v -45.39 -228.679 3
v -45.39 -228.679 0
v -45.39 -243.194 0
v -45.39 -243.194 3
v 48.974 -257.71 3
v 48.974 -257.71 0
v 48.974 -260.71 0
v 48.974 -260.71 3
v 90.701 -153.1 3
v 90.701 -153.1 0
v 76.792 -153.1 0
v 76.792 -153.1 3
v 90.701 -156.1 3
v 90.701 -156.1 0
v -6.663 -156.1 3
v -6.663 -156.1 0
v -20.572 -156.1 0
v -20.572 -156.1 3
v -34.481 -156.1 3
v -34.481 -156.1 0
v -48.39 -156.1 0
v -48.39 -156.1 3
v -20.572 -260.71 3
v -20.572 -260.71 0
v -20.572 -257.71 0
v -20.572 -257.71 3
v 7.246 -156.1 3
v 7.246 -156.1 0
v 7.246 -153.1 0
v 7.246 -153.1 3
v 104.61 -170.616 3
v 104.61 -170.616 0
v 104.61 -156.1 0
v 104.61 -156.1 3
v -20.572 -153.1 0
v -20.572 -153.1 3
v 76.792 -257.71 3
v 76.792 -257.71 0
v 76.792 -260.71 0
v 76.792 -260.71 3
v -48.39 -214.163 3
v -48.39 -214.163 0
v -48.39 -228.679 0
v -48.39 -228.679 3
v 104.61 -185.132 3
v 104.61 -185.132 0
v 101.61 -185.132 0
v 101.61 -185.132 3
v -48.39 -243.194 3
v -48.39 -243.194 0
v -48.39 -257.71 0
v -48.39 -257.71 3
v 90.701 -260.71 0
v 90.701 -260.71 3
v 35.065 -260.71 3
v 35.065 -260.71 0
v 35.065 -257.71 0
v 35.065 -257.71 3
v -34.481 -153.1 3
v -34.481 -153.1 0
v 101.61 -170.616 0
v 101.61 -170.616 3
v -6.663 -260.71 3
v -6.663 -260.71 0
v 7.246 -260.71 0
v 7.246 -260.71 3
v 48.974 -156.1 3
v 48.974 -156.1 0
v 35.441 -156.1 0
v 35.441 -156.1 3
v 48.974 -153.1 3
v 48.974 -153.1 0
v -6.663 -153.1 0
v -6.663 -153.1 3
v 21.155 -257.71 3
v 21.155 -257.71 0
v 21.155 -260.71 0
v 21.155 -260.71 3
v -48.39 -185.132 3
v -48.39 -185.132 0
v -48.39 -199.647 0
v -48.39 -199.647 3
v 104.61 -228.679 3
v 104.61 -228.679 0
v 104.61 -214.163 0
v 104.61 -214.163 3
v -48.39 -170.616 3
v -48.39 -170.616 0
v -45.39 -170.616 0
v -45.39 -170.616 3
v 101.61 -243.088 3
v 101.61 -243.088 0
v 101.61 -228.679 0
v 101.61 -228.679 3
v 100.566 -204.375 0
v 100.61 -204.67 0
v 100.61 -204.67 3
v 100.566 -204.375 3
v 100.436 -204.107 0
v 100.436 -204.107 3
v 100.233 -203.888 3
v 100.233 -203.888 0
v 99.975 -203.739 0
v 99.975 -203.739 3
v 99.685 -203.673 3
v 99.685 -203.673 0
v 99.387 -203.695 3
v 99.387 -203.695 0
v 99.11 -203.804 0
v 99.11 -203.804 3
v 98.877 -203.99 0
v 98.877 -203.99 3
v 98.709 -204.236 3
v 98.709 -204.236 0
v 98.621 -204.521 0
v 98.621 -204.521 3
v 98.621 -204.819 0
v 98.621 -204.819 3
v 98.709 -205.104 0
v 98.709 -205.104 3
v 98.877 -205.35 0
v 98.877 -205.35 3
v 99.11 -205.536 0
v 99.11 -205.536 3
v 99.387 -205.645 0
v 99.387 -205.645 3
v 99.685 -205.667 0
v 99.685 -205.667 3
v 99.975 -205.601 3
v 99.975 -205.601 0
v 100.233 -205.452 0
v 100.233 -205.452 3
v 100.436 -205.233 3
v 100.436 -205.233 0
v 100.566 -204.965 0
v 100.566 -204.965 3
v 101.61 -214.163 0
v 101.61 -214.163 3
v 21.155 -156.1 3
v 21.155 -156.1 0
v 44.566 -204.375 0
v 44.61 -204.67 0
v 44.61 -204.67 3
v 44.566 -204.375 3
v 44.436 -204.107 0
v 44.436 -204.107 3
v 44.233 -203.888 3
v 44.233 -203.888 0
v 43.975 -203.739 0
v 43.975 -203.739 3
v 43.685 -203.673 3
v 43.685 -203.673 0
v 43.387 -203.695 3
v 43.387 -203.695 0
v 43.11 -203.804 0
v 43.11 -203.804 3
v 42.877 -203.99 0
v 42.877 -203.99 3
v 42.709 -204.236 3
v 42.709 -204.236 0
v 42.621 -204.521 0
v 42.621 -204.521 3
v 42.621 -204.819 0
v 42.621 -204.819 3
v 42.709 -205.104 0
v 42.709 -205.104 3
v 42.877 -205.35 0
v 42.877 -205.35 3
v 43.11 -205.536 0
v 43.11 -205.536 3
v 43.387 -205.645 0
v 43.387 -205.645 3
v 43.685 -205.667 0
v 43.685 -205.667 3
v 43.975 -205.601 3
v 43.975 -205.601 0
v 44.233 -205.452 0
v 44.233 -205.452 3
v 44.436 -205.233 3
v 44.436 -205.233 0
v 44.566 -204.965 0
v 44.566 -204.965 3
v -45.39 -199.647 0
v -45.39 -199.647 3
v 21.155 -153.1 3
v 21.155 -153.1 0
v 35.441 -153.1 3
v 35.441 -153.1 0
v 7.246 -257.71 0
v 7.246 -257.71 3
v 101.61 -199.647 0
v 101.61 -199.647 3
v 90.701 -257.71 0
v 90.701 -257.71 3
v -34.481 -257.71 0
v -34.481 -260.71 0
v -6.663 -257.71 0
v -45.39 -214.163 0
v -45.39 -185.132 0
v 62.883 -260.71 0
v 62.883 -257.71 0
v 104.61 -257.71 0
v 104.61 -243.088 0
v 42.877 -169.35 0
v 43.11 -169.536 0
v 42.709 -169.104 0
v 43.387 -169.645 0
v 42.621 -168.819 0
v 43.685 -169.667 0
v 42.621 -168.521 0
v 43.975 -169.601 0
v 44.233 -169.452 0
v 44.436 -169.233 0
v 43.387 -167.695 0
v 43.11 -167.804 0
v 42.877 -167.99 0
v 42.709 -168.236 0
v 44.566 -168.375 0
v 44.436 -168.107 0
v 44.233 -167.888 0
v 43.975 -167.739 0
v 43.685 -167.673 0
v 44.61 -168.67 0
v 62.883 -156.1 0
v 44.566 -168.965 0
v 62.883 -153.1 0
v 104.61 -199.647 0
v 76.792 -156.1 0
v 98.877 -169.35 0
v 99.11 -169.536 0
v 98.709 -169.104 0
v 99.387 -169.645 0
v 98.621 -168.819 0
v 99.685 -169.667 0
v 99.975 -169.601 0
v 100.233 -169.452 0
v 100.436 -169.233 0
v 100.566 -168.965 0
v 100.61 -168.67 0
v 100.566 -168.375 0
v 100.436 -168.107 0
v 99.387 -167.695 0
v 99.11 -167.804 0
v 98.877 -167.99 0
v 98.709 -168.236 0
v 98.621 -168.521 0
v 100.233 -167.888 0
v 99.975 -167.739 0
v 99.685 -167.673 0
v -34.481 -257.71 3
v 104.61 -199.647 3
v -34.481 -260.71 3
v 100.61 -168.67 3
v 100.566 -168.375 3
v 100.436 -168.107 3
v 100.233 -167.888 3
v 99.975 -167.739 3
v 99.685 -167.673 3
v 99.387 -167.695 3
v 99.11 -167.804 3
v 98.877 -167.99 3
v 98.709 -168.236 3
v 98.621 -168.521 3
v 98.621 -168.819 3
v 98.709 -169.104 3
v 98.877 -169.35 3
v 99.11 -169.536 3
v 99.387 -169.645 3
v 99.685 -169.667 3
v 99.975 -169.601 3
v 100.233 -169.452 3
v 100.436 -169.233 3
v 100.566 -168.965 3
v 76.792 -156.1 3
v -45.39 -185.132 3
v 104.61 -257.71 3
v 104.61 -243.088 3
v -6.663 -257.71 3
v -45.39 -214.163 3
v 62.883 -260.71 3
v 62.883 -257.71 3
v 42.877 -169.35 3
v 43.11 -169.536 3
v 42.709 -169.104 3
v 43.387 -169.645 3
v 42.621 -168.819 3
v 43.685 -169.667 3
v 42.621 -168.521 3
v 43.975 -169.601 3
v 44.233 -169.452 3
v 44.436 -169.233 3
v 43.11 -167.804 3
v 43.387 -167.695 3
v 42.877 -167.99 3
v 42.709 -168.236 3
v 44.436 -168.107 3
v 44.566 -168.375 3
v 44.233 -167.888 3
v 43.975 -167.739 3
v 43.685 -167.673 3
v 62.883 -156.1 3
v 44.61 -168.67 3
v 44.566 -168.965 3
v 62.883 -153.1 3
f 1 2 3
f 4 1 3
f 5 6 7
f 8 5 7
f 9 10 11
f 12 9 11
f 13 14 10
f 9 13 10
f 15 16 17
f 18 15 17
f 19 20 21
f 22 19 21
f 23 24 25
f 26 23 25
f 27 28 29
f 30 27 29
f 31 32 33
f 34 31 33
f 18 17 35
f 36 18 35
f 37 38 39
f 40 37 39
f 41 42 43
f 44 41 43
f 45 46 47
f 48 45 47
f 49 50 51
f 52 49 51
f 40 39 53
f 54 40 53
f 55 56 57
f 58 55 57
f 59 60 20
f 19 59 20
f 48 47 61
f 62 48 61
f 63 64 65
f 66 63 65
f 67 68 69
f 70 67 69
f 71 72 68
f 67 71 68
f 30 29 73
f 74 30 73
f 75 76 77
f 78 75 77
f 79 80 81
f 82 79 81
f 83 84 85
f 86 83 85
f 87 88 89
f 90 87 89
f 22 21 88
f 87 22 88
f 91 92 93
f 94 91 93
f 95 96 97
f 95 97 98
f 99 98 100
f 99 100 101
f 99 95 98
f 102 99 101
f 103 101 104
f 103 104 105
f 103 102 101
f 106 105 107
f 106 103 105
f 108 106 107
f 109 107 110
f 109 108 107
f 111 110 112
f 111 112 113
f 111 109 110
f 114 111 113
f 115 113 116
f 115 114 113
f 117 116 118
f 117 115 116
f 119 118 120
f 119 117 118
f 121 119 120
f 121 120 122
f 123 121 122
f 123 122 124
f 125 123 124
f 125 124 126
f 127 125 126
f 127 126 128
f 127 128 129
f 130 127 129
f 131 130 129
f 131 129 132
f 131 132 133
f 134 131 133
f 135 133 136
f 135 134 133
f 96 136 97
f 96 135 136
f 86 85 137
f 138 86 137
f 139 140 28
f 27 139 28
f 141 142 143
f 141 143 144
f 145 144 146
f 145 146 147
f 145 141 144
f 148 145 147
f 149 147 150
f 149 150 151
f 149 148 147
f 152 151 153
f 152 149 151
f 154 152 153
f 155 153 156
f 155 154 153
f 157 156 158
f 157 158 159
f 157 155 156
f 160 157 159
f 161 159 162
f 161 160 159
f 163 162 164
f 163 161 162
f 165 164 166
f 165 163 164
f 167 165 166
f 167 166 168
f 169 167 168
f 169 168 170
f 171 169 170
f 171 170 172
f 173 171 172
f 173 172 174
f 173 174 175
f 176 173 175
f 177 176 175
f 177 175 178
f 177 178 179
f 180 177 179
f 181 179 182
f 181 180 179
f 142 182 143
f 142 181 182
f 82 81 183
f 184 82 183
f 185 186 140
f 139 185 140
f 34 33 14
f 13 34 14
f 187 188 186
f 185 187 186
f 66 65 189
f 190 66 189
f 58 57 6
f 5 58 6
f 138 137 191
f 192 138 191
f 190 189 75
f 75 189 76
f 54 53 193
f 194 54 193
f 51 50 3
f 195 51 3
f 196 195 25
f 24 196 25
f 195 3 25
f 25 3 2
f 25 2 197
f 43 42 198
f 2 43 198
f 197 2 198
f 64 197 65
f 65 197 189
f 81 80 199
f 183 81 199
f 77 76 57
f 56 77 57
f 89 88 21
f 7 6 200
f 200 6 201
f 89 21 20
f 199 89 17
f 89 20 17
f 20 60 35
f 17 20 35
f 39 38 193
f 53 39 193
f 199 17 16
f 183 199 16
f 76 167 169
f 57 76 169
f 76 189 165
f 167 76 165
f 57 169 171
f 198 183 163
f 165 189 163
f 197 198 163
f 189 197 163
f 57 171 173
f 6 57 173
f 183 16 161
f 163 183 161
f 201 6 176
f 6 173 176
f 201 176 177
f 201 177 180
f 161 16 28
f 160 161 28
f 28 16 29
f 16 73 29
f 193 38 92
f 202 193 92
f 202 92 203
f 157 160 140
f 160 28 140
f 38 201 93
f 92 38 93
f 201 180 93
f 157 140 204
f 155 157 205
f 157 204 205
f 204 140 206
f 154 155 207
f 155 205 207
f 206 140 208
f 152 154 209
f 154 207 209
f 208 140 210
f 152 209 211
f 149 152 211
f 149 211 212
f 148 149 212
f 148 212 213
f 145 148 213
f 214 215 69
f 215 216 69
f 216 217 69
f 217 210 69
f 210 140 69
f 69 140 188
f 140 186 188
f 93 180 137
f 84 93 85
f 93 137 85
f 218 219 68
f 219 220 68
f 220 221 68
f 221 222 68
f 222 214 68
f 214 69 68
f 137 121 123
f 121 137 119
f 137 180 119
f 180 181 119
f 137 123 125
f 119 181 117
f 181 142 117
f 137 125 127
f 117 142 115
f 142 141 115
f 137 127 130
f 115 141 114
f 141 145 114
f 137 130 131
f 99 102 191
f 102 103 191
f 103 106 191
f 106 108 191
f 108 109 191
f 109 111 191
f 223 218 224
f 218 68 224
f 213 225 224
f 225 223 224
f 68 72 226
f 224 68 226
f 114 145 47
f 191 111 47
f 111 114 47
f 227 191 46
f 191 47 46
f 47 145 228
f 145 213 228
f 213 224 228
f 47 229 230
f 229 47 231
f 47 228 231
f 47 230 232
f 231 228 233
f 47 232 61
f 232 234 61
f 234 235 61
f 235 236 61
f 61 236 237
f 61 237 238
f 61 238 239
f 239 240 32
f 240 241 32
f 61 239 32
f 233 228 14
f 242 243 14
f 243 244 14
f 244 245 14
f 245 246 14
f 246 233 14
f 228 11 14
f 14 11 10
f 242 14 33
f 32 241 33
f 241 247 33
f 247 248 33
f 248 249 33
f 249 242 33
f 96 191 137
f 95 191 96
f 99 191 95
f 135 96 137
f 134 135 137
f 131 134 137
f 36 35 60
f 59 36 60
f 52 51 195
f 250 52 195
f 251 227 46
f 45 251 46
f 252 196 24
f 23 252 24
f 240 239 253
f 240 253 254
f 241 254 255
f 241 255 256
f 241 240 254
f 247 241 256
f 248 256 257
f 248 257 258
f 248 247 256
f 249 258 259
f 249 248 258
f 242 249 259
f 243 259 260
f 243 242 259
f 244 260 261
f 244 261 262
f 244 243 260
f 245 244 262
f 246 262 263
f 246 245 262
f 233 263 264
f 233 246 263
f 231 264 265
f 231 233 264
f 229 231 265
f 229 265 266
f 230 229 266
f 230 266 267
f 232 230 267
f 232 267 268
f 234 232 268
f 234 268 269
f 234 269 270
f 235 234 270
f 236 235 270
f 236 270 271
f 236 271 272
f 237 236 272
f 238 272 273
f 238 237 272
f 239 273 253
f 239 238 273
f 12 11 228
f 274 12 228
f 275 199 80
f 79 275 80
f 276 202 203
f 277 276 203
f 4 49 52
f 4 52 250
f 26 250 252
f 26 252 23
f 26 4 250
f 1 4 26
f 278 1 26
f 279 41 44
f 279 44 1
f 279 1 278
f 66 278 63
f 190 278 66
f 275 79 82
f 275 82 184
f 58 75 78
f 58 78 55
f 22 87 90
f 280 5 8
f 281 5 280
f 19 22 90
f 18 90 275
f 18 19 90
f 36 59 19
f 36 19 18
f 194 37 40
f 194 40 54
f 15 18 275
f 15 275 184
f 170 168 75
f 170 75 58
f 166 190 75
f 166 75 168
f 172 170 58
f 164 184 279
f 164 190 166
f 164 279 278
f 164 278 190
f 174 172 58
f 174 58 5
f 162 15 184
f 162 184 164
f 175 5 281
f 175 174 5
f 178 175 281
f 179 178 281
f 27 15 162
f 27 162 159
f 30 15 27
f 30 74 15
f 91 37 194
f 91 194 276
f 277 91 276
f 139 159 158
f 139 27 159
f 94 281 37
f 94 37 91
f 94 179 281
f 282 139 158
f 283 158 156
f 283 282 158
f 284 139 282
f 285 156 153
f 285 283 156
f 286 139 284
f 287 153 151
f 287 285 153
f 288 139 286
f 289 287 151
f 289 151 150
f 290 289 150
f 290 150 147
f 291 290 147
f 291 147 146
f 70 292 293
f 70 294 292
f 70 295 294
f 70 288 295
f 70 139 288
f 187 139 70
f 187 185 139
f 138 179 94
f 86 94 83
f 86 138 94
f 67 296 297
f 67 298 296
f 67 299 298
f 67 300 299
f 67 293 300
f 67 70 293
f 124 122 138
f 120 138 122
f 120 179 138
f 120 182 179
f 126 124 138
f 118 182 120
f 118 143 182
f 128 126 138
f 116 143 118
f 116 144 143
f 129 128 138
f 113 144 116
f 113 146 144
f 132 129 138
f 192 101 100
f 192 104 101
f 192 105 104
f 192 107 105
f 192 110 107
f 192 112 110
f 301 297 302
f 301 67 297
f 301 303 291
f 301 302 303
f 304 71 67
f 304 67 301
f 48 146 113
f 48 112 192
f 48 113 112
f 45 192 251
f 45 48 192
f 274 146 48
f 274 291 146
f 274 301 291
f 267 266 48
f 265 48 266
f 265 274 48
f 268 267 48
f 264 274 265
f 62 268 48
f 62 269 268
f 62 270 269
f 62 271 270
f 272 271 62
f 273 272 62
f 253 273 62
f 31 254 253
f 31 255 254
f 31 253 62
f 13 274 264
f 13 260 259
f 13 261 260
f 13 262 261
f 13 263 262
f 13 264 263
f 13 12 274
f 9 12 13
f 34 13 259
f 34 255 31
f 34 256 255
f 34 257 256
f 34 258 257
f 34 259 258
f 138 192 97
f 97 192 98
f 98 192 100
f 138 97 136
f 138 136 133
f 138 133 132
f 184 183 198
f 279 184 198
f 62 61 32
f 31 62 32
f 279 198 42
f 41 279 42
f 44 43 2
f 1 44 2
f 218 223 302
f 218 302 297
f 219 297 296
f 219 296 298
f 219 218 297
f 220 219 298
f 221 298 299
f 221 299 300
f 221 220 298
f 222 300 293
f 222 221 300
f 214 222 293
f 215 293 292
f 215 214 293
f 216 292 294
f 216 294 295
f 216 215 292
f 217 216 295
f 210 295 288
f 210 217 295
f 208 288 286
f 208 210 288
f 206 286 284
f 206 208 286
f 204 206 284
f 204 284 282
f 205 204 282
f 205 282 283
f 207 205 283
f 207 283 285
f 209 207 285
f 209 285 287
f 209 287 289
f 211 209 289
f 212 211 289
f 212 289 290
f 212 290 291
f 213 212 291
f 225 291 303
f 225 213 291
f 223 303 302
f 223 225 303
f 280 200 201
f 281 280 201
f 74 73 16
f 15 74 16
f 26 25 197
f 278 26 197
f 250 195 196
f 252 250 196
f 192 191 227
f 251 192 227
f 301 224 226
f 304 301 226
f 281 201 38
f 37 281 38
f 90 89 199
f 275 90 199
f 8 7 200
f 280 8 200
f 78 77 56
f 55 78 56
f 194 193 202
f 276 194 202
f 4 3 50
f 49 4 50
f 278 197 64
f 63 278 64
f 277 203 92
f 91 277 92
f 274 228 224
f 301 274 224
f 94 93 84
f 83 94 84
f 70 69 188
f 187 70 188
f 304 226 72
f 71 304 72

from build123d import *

# Parameters (mm, degrees)
CROQUIS1_R              = 1
SALIENTE_EXTRUIR1_DEPTH = 3


with BuildPart() as part:
    # Croquis1 → Saliente-Extruir1 (new body)
    with BuildSketch(Plane.XY):
        Polygon((-34.480909091, -156.100114598), (-48.39, -156.100114598), (-48.39, -170.615828883), (-45.39, -170.615828883), (-45.39, -185.131543169), (-48.39, -185.131543169), (-48.39, -199.647257455), (-45.39, -199.647257455), (-45.39, -214.162971741), (-48.39, -214.162971741), (-48.39, -228.678686026), (-45.39, -228.678686026), (-45.39, -243.194400312), (-48.39, -243.194400312), (-48.39, -257.710114598), (-34.480909091, -257.710114598), (-34.480909091, -260.710114598), (-20.571818182, -260.710114598), (-20.571818182, -257.710114598), (-6.662727273, -257.710114598), (-6.662727273, -260.710114598), (7.246363636, -260.710114598), (7.246363636, -257.710114598), (21.155454545, -257.710114598), (21.155454545, -260.710114598), (35.064545455, -260.710114598), (35.064545455, -257.710114598), (48.973636364, -257.710114598), (48.973636364, -260.710114598), (62.882727273, -260.710114598), (62.882727273, -257.710114598), (76.791818182, -257.710114598), (76.791818182, -260.710114598), (90.700909091, -260.710114598), (90.700909091, -257.710114598), (104.61, -257.710114598), (104.61, -243.087661526), (101.61, -243.087661526), (101.61, -228.678686026), (104.61, -228.678686026), (104.61, -214.162971741), (101.61, -214.162971741), (101.61, -199.647257455), (104.61, -199.647257455), (104.61, -185.131543169), (101.61, -185.131543169), (101.61, -170.615828883), (104.61, -170.615828883), (104.61, -156.100114598), (90.700909091, -156.100114598), (90.700909091, -153.100114598), (76.791818182, -153.100114598), (76.791818182, -156.100114598), (62.882727273, -156.100114598), (62.882727273, -153.100114598), (48.973636364, -153.100114598), (48.973636364, -156.100114598), (35.440889541, -156.100114598), (35.440889541, -153.100114598), (21.155454545, -153.100114598), (21.155454545, -156.100114598), (7.246363636, -156.100114598), (7.246363636, -153.100114598), (-6.662727273, -153.100114598), (-6.662727273, -156.100114598), (-20.571818182, -156.100114598), (-20.571818182, -153.100114598), (-34.480909091, -153.100114598), align=None)
        with Locations((99.61, -168.670114598)):
            Circle(CROQUIS1_R, mode=Mode.SUBTRACT)
        with Locations((99.61, -204.670114598)):
            Circle(CROQUIS1_R, mode=Mode.SUBTRACT)
        with Locations((43.61, -168.670114598)):
            Circle(CROQUIS1_R, mode=Mode.SUBTRACT)
        with Locations((43.61, -204.670114598)):
            Circle(CROQUIS1_R, mode=Mode.SUBTRACT)
    extrude(amount=SALIENTE_EXTRUIR1_DEPTH)


solid = part.part
